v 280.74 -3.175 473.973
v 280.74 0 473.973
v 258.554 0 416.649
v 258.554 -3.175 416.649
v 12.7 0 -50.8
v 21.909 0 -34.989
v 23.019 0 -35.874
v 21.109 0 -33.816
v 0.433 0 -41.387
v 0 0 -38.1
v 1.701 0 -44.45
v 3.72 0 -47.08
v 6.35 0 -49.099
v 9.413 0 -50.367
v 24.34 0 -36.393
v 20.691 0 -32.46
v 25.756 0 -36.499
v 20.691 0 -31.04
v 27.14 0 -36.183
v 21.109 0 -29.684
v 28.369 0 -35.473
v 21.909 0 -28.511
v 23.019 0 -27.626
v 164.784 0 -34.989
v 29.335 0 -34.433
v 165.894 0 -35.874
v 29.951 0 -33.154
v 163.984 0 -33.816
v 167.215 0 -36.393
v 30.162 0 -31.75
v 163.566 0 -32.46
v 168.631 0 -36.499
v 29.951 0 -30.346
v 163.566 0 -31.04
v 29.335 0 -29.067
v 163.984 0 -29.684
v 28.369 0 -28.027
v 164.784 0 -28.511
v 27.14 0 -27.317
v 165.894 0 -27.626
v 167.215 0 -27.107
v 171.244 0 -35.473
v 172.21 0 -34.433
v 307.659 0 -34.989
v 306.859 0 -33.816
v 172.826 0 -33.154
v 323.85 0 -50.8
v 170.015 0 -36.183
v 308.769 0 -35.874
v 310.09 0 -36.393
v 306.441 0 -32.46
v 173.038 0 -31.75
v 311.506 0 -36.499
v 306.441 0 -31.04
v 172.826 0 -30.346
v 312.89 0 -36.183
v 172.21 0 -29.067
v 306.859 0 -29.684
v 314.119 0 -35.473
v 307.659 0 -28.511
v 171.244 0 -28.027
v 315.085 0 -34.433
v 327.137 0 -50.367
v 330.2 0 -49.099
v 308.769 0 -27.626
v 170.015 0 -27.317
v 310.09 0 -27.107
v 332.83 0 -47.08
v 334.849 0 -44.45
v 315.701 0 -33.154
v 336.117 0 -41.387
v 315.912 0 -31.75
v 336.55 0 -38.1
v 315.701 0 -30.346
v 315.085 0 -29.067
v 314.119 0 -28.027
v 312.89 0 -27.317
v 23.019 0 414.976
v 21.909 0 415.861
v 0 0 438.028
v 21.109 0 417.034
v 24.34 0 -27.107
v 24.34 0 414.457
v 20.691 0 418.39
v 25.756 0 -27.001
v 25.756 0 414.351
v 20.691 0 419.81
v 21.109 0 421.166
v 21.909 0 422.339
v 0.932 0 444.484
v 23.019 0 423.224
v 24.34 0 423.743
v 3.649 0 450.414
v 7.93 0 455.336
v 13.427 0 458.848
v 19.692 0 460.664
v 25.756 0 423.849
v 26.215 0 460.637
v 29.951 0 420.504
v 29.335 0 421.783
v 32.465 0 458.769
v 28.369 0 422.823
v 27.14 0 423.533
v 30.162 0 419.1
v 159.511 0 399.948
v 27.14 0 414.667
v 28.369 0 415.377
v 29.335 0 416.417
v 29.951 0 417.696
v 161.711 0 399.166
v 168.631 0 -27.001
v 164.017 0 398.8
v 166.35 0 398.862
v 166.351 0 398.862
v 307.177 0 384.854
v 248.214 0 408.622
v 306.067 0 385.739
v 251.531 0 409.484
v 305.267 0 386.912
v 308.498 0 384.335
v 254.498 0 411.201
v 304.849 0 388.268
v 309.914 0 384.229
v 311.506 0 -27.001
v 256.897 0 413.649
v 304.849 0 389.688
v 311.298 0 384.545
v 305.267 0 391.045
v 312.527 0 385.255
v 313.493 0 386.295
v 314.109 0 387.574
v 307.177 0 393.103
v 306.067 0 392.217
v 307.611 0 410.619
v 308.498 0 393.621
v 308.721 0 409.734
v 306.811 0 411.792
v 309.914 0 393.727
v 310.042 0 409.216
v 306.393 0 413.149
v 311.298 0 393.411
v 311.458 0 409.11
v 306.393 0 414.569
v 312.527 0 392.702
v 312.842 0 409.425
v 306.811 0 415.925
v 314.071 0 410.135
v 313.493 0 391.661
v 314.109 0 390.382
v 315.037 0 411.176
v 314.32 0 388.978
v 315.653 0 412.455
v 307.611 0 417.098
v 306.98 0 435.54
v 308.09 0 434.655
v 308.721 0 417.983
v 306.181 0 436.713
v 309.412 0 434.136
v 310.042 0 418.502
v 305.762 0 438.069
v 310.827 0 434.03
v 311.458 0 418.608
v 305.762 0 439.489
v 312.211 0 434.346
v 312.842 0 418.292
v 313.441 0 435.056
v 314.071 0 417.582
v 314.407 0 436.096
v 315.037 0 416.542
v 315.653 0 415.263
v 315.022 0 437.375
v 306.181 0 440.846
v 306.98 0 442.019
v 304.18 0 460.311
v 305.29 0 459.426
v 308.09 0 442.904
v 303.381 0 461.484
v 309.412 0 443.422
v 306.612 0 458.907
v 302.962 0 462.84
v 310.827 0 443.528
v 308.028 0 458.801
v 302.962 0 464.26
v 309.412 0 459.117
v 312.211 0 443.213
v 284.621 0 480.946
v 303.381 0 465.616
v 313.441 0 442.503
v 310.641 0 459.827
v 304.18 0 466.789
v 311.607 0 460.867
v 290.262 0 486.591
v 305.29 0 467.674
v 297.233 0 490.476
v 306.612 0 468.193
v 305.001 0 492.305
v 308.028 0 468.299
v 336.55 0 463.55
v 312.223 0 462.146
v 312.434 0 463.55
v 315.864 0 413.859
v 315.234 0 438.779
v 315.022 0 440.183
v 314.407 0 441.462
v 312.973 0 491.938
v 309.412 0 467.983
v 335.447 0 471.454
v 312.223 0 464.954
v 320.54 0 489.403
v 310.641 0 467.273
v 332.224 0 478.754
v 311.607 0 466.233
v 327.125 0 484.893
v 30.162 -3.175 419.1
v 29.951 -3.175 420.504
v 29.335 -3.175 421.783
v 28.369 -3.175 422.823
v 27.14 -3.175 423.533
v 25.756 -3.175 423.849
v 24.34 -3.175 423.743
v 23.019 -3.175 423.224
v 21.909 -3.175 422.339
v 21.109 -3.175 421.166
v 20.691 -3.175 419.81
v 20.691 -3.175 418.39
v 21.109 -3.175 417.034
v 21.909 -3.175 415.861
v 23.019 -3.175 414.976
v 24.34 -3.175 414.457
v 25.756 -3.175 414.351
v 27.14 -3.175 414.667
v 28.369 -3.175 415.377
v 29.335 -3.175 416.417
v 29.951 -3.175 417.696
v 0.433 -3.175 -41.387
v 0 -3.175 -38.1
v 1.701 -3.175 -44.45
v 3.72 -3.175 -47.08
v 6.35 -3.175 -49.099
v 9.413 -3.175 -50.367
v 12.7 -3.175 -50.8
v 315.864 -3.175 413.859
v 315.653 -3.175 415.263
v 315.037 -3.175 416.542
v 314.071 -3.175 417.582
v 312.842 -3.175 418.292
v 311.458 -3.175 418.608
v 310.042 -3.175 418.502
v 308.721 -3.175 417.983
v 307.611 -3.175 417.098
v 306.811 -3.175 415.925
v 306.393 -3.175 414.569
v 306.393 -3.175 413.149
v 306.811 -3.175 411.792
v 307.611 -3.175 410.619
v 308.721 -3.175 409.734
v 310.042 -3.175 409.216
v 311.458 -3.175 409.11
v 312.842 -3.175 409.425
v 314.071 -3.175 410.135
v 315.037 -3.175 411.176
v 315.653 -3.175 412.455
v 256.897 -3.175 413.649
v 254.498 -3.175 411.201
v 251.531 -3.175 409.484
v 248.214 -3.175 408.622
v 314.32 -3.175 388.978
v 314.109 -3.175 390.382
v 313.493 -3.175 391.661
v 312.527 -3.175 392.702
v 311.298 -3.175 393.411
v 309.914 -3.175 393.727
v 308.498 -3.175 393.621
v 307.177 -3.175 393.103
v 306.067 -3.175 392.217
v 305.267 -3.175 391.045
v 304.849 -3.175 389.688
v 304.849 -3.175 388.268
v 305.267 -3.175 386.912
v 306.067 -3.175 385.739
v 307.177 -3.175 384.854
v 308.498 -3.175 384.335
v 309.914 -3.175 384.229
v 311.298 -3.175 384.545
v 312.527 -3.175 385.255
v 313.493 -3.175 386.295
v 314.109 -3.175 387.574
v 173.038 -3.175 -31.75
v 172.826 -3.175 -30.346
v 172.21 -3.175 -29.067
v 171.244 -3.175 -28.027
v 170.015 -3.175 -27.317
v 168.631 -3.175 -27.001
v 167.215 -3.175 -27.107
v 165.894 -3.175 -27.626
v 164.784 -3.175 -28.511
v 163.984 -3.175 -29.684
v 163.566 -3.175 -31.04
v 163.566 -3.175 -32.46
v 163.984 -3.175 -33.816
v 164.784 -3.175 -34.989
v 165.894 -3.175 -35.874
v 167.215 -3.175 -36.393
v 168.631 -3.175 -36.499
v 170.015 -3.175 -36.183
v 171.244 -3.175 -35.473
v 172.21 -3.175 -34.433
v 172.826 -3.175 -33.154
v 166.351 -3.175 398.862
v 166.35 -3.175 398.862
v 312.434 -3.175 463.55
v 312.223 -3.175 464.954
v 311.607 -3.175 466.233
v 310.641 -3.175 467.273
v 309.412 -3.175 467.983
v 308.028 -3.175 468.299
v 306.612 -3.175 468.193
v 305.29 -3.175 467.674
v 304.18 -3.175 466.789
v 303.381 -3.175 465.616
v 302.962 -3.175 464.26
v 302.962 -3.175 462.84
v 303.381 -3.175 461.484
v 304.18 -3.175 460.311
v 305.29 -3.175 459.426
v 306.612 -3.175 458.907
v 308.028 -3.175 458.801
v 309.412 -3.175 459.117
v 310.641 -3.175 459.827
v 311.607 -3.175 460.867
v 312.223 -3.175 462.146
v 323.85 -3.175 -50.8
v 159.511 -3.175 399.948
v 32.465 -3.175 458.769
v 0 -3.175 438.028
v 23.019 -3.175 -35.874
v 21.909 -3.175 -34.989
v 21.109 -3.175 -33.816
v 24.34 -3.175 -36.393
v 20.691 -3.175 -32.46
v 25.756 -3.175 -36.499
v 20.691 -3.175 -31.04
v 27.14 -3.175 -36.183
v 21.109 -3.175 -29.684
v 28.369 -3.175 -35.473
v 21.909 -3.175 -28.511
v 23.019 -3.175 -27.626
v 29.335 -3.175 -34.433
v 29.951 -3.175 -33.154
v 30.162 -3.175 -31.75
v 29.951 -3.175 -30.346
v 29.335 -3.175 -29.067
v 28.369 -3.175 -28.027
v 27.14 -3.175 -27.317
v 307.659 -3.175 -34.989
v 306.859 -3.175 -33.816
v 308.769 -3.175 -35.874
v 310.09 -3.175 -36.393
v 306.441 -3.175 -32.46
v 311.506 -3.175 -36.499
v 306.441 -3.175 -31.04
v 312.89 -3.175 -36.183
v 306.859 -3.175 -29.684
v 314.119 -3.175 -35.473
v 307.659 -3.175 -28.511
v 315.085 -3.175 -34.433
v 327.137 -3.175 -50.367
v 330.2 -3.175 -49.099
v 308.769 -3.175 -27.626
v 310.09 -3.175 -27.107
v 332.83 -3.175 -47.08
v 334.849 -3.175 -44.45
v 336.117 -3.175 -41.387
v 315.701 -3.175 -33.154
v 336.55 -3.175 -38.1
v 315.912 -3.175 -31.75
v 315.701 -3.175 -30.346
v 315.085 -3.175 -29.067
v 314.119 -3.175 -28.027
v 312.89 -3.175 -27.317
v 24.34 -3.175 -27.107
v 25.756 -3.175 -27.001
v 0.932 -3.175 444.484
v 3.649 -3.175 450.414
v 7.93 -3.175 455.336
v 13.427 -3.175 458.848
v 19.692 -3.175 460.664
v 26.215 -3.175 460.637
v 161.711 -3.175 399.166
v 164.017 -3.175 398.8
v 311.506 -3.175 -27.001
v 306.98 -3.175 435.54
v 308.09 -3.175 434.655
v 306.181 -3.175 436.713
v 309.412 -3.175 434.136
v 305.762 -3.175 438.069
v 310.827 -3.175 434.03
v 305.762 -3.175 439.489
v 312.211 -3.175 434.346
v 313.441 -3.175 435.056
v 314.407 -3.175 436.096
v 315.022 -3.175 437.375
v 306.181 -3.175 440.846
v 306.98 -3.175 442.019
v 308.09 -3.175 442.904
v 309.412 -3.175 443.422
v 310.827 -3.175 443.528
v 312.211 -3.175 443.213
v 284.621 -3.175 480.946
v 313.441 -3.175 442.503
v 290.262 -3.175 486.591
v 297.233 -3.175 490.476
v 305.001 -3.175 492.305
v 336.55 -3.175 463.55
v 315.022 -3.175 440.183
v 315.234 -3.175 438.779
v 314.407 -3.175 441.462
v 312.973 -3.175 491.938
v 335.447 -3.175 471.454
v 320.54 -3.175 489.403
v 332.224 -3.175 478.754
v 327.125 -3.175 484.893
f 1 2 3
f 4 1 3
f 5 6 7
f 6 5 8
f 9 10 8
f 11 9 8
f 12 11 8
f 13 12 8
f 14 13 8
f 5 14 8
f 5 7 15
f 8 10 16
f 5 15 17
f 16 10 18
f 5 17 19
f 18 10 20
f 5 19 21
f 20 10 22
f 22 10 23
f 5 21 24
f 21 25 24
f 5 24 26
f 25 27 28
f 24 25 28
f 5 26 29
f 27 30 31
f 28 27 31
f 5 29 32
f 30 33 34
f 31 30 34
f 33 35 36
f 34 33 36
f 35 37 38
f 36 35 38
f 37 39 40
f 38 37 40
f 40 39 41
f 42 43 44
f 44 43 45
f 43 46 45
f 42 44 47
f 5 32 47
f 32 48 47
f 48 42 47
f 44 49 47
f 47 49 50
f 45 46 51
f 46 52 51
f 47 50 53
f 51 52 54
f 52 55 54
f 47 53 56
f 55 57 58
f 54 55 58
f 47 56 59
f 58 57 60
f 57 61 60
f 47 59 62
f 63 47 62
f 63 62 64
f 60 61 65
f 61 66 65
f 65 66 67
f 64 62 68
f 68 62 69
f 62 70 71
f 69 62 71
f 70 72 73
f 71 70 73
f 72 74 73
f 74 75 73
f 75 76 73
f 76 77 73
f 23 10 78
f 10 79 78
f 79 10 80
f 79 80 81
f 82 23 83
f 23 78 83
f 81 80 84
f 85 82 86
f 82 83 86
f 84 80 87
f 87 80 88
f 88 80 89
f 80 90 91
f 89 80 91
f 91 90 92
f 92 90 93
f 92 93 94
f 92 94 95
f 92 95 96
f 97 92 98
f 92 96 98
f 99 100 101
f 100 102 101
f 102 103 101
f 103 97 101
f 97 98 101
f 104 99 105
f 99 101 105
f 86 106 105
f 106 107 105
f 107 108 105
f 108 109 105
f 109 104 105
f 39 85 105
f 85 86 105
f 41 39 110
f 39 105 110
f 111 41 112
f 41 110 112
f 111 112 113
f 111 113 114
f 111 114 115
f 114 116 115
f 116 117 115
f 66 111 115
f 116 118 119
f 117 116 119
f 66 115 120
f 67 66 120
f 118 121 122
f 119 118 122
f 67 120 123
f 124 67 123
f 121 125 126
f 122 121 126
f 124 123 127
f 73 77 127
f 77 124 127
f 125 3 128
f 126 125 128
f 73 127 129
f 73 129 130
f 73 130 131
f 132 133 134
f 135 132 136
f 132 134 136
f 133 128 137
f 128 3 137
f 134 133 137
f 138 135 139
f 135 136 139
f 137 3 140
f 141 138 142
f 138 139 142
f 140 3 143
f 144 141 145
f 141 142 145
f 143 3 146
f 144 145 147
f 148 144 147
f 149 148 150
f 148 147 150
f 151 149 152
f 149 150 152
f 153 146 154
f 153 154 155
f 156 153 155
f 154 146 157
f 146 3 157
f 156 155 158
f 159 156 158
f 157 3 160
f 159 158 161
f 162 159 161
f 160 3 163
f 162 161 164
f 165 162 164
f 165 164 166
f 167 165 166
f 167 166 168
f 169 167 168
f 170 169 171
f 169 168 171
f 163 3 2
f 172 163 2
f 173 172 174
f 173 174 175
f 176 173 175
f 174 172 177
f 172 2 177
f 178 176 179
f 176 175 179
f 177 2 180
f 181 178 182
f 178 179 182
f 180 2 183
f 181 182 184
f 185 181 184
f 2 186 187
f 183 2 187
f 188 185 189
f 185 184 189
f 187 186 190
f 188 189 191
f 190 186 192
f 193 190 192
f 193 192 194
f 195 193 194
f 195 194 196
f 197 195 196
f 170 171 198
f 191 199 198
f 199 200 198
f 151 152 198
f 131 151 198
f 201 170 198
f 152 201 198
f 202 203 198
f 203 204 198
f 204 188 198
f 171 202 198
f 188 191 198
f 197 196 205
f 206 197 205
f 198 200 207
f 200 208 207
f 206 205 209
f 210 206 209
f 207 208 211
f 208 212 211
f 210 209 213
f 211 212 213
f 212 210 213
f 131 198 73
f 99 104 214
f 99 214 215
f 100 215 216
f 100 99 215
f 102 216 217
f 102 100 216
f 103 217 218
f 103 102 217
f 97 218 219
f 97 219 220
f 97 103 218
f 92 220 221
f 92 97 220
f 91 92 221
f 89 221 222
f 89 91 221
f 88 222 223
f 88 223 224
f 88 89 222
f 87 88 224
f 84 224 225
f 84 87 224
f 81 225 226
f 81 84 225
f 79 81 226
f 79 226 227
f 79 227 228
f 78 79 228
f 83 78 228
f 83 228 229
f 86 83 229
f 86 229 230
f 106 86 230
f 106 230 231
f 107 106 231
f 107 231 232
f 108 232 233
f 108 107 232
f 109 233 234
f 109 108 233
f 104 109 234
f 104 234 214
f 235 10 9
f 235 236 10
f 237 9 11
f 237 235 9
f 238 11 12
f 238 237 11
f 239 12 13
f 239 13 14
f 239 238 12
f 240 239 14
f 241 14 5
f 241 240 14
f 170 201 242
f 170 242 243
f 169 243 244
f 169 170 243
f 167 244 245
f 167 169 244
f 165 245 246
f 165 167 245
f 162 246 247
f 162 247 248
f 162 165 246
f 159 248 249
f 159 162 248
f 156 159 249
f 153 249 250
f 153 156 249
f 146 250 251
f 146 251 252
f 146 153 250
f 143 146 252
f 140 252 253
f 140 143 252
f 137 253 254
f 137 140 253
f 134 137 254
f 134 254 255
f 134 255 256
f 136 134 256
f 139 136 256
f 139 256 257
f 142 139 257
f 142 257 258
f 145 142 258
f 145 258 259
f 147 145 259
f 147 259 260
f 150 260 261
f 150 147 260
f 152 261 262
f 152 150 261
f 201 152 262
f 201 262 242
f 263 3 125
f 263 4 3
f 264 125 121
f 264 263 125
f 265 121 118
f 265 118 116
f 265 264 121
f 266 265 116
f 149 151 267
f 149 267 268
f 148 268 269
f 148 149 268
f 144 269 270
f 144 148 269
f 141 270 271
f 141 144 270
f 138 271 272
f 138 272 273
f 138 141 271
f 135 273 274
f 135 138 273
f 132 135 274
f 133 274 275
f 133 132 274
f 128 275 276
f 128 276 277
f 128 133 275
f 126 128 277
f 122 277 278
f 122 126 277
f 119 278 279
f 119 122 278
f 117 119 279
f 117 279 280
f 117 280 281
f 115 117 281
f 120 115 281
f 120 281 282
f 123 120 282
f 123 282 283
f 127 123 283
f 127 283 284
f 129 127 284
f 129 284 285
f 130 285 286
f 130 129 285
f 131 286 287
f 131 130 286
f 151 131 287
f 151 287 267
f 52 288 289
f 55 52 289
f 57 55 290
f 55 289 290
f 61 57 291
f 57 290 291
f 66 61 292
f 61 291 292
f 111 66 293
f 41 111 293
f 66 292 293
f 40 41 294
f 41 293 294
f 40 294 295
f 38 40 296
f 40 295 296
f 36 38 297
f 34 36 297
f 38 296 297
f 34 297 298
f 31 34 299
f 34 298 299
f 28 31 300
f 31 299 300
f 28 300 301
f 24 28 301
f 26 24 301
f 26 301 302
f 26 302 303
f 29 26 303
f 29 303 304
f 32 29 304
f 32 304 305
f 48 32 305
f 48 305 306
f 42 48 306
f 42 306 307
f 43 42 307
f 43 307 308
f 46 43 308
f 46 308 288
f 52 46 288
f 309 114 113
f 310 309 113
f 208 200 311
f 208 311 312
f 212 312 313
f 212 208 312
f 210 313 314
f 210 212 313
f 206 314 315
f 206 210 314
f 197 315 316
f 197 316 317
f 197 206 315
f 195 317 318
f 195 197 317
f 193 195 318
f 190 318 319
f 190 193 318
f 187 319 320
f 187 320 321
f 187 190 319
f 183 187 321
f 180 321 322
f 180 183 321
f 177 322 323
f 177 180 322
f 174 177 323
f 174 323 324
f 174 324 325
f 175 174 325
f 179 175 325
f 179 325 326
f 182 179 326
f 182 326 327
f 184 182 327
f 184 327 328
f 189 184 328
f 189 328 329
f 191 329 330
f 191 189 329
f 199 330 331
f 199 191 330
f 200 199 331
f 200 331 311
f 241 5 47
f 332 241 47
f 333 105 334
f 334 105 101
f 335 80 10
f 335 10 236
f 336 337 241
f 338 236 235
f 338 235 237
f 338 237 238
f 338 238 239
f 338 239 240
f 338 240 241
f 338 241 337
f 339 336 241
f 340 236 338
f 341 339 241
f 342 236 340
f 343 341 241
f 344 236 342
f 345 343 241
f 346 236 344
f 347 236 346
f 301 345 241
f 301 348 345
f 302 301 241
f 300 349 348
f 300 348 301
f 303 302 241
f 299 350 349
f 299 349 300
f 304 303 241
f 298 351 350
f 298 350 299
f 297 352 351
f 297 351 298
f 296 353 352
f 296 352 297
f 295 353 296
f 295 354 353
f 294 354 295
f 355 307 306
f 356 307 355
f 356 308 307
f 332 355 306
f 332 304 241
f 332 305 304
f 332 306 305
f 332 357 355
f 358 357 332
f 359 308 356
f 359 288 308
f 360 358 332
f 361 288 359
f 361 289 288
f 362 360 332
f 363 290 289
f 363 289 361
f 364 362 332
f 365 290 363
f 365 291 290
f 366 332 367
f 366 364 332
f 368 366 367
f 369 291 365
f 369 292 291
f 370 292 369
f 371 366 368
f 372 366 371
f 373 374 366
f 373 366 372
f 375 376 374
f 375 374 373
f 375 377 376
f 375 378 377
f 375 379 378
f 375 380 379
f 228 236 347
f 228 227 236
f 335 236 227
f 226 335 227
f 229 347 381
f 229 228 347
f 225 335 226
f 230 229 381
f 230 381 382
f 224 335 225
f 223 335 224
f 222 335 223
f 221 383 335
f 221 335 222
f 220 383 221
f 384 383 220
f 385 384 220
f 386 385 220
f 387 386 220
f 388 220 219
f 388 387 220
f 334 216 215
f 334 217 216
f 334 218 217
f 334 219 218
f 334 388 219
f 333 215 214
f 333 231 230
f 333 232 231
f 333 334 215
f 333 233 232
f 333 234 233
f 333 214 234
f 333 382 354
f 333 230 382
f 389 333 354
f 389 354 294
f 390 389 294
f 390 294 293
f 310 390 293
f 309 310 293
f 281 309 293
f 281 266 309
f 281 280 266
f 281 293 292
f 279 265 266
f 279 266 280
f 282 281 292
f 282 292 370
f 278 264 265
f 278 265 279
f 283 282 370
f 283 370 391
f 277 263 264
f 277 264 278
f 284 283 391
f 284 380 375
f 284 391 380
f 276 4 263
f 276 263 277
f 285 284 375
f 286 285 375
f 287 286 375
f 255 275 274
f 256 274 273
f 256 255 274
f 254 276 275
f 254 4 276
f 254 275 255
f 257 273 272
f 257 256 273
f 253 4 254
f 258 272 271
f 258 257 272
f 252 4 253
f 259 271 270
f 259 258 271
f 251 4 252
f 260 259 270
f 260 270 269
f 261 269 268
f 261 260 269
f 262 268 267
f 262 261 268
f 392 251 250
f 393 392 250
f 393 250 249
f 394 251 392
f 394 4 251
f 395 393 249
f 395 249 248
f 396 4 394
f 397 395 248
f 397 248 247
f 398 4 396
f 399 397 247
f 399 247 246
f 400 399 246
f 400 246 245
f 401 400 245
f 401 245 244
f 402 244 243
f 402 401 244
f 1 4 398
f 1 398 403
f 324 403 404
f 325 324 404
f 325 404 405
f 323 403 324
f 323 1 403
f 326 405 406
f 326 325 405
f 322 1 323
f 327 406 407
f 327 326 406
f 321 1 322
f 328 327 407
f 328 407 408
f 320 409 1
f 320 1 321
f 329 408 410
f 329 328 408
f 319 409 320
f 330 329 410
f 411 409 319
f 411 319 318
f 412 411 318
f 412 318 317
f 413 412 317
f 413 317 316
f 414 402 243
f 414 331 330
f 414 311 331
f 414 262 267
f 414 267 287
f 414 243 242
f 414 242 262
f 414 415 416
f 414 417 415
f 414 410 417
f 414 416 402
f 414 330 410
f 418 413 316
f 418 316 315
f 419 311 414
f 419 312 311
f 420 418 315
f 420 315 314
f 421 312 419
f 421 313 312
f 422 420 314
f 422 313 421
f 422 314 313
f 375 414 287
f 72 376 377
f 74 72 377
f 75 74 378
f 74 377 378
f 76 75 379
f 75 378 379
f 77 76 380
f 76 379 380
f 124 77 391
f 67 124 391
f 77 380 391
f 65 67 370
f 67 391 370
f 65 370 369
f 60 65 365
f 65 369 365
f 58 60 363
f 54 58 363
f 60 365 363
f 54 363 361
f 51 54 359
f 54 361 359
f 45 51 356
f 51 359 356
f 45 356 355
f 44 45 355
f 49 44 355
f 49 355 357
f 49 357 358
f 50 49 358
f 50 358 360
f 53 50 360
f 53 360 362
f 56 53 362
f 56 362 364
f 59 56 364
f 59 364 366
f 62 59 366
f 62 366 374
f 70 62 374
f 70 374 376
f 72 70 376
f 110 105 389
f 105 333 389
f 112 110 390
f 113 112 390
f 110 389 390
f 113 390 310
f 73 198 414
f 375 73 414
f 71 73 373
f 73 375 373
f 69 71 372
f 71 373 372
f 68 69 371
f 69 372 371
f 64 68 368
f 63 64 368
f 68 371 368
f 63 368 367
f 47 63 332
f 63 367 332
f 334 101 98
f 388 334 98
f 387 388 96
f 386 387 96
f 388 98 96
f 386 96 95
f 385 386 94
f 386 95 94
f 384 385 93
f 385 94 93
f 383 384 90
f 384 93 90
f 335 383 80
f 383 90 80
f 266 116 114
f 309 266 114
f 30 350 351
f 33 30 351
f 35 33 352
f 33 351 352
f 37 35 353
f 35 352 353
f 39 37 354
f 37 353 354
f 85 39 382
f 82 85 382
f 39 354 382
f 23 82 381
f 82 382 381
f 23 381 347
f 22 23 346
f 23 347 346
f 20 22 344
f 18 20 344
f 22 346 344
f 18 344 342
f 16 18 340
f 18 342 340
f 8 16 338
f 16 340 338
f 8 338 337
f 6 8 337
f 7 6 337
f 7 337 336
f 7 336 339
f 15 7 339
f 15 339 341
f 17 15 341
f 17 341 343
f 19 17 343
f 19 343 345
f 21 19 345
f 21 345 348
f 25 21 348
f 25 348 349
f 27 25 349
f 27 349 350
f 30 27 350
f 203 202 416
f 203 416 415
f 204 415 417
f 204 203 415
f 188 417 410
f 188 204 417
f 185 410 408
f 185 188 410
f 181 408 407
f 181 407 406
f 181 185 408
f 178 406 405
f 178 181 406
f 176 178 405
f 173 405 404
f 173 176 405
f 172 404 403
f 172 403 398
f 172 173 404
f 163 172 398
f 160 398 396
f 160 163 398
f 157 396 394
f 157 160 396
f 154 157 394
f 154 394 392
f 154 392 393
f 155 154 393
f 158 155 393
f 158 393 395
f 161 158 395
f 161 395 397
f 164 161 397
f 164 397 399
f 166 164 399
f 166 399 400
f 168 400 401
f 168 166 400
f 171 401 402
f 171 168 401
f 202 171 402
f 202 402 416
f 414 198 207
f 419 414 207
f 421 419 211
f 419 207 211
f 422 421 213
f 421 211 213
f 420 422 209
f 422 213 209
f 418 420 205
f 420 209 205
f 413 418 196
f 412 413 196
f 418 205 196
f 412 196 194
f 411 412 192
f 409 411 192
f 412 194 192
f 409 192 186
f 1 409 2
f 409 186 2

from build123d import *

# Parameters (mm, degrees)
F1_R     = 4.7625
F2_DEPTH = 3.175
F3_R     = 12.7
F4_DEPTH = 50.8
F5_R     = 12.7
F6_R     = 4.7625
F7_DEPTH = 3.176


with BuildPart() as f2:
    # F1 (on Front) → F2 (new body)
    with BuildSketch(Plane.XZ):
        with BuildLine():
            Line((0, 438.0280625751), (0, 0))
            Line((0, 0), (336.55, 0))
            Line((336.55, 0), (336.55, 463.55))
            ThreePointArc((336.55, 463.55), (312.9733695253, 491.9375484372), (280.7399069367, 473.9732978163))
            Line((280.7399069367, 473.9732978163), (255.7973116004, 409.5266607723))
            Line((255.7973116004, 409.5266607723), (166.3505145476, 398.8620060081))
            Line((166.3505145476, 398.8620060081), (162.7768007124, 398.4359155775))
            Line((162.7768007124, 398.4359155775), (159.5108394321, 399.9480268652))
            Line((159.5108394321, 399.9480268652), (32.4645066839, 458.7693591847))
            ThreePointArc((32.4645066839, 458.7693591847), (10.5523855062, 457.2889027896), (0, 438.0280625751))
        make_face()
        with Locations((25.4, 419.1)):
            Circle(F1_R, mode=Mode.SUBTRACT)
        with Locations((309.5579415817, 388.9781352495)):
            Circle(F1_R, mode=Mode.SUBTRACT)
        with Locations((311.1019283196, 413.8587544951)):
            Circle(F1_R, mode=Mode.SUBTRACT)
        with Locations((310.4715508715, 438.7792627838)):
            Circle(F1_R, mode=Mode.SUBTRACT)
        with Locations((307.6716067903, 463.55)):
            Circle(F1_R, mode=Mode.SUBTRACT)
    extrude(amount=F2_DEPTH)

    # F3
    f3_edges = [f2.edges().sort_by_distance(p)[0] for p in [
        (162.776801, -1.5875, 398.435916),
        (255.797312, -1.5875, 409.526661),
    ]]
    fillet(f3_edges, radius=F3_R)

    # F4 (add): a face of the model
    f4_faces = [f2.faces().sort_by_distance(p)[0] for p in [
        (168.275, -1.5875, 0),
    ]]
    extrude(f4_faces, amount=F4_DEPTH)

    # F5
    f5_edges = [f2.edges().sort_by_distance(p)[0] for p in [
        (0, -1.5875, -50.8),
        (336.55, -1.5875, -50.8),
    ]]
    fillet(f5_edges, radius=F5_R)

    # F6 (on face) → F7 (cut, through all)
    with BuildSketch(Plane.XZ.offset(3.175)):
        with Locations((25.4, -31.75)):
            Circle(F6_R)
        with Locations((168.275, -31.75)):
            Circle(F6_R)
        with Locations((311.15, -31.75)):
            Circle(F6_R)
    extrude(amount=-F7_DEPTH, mode=Mode.SUBTRACT)


solid = f2.part
